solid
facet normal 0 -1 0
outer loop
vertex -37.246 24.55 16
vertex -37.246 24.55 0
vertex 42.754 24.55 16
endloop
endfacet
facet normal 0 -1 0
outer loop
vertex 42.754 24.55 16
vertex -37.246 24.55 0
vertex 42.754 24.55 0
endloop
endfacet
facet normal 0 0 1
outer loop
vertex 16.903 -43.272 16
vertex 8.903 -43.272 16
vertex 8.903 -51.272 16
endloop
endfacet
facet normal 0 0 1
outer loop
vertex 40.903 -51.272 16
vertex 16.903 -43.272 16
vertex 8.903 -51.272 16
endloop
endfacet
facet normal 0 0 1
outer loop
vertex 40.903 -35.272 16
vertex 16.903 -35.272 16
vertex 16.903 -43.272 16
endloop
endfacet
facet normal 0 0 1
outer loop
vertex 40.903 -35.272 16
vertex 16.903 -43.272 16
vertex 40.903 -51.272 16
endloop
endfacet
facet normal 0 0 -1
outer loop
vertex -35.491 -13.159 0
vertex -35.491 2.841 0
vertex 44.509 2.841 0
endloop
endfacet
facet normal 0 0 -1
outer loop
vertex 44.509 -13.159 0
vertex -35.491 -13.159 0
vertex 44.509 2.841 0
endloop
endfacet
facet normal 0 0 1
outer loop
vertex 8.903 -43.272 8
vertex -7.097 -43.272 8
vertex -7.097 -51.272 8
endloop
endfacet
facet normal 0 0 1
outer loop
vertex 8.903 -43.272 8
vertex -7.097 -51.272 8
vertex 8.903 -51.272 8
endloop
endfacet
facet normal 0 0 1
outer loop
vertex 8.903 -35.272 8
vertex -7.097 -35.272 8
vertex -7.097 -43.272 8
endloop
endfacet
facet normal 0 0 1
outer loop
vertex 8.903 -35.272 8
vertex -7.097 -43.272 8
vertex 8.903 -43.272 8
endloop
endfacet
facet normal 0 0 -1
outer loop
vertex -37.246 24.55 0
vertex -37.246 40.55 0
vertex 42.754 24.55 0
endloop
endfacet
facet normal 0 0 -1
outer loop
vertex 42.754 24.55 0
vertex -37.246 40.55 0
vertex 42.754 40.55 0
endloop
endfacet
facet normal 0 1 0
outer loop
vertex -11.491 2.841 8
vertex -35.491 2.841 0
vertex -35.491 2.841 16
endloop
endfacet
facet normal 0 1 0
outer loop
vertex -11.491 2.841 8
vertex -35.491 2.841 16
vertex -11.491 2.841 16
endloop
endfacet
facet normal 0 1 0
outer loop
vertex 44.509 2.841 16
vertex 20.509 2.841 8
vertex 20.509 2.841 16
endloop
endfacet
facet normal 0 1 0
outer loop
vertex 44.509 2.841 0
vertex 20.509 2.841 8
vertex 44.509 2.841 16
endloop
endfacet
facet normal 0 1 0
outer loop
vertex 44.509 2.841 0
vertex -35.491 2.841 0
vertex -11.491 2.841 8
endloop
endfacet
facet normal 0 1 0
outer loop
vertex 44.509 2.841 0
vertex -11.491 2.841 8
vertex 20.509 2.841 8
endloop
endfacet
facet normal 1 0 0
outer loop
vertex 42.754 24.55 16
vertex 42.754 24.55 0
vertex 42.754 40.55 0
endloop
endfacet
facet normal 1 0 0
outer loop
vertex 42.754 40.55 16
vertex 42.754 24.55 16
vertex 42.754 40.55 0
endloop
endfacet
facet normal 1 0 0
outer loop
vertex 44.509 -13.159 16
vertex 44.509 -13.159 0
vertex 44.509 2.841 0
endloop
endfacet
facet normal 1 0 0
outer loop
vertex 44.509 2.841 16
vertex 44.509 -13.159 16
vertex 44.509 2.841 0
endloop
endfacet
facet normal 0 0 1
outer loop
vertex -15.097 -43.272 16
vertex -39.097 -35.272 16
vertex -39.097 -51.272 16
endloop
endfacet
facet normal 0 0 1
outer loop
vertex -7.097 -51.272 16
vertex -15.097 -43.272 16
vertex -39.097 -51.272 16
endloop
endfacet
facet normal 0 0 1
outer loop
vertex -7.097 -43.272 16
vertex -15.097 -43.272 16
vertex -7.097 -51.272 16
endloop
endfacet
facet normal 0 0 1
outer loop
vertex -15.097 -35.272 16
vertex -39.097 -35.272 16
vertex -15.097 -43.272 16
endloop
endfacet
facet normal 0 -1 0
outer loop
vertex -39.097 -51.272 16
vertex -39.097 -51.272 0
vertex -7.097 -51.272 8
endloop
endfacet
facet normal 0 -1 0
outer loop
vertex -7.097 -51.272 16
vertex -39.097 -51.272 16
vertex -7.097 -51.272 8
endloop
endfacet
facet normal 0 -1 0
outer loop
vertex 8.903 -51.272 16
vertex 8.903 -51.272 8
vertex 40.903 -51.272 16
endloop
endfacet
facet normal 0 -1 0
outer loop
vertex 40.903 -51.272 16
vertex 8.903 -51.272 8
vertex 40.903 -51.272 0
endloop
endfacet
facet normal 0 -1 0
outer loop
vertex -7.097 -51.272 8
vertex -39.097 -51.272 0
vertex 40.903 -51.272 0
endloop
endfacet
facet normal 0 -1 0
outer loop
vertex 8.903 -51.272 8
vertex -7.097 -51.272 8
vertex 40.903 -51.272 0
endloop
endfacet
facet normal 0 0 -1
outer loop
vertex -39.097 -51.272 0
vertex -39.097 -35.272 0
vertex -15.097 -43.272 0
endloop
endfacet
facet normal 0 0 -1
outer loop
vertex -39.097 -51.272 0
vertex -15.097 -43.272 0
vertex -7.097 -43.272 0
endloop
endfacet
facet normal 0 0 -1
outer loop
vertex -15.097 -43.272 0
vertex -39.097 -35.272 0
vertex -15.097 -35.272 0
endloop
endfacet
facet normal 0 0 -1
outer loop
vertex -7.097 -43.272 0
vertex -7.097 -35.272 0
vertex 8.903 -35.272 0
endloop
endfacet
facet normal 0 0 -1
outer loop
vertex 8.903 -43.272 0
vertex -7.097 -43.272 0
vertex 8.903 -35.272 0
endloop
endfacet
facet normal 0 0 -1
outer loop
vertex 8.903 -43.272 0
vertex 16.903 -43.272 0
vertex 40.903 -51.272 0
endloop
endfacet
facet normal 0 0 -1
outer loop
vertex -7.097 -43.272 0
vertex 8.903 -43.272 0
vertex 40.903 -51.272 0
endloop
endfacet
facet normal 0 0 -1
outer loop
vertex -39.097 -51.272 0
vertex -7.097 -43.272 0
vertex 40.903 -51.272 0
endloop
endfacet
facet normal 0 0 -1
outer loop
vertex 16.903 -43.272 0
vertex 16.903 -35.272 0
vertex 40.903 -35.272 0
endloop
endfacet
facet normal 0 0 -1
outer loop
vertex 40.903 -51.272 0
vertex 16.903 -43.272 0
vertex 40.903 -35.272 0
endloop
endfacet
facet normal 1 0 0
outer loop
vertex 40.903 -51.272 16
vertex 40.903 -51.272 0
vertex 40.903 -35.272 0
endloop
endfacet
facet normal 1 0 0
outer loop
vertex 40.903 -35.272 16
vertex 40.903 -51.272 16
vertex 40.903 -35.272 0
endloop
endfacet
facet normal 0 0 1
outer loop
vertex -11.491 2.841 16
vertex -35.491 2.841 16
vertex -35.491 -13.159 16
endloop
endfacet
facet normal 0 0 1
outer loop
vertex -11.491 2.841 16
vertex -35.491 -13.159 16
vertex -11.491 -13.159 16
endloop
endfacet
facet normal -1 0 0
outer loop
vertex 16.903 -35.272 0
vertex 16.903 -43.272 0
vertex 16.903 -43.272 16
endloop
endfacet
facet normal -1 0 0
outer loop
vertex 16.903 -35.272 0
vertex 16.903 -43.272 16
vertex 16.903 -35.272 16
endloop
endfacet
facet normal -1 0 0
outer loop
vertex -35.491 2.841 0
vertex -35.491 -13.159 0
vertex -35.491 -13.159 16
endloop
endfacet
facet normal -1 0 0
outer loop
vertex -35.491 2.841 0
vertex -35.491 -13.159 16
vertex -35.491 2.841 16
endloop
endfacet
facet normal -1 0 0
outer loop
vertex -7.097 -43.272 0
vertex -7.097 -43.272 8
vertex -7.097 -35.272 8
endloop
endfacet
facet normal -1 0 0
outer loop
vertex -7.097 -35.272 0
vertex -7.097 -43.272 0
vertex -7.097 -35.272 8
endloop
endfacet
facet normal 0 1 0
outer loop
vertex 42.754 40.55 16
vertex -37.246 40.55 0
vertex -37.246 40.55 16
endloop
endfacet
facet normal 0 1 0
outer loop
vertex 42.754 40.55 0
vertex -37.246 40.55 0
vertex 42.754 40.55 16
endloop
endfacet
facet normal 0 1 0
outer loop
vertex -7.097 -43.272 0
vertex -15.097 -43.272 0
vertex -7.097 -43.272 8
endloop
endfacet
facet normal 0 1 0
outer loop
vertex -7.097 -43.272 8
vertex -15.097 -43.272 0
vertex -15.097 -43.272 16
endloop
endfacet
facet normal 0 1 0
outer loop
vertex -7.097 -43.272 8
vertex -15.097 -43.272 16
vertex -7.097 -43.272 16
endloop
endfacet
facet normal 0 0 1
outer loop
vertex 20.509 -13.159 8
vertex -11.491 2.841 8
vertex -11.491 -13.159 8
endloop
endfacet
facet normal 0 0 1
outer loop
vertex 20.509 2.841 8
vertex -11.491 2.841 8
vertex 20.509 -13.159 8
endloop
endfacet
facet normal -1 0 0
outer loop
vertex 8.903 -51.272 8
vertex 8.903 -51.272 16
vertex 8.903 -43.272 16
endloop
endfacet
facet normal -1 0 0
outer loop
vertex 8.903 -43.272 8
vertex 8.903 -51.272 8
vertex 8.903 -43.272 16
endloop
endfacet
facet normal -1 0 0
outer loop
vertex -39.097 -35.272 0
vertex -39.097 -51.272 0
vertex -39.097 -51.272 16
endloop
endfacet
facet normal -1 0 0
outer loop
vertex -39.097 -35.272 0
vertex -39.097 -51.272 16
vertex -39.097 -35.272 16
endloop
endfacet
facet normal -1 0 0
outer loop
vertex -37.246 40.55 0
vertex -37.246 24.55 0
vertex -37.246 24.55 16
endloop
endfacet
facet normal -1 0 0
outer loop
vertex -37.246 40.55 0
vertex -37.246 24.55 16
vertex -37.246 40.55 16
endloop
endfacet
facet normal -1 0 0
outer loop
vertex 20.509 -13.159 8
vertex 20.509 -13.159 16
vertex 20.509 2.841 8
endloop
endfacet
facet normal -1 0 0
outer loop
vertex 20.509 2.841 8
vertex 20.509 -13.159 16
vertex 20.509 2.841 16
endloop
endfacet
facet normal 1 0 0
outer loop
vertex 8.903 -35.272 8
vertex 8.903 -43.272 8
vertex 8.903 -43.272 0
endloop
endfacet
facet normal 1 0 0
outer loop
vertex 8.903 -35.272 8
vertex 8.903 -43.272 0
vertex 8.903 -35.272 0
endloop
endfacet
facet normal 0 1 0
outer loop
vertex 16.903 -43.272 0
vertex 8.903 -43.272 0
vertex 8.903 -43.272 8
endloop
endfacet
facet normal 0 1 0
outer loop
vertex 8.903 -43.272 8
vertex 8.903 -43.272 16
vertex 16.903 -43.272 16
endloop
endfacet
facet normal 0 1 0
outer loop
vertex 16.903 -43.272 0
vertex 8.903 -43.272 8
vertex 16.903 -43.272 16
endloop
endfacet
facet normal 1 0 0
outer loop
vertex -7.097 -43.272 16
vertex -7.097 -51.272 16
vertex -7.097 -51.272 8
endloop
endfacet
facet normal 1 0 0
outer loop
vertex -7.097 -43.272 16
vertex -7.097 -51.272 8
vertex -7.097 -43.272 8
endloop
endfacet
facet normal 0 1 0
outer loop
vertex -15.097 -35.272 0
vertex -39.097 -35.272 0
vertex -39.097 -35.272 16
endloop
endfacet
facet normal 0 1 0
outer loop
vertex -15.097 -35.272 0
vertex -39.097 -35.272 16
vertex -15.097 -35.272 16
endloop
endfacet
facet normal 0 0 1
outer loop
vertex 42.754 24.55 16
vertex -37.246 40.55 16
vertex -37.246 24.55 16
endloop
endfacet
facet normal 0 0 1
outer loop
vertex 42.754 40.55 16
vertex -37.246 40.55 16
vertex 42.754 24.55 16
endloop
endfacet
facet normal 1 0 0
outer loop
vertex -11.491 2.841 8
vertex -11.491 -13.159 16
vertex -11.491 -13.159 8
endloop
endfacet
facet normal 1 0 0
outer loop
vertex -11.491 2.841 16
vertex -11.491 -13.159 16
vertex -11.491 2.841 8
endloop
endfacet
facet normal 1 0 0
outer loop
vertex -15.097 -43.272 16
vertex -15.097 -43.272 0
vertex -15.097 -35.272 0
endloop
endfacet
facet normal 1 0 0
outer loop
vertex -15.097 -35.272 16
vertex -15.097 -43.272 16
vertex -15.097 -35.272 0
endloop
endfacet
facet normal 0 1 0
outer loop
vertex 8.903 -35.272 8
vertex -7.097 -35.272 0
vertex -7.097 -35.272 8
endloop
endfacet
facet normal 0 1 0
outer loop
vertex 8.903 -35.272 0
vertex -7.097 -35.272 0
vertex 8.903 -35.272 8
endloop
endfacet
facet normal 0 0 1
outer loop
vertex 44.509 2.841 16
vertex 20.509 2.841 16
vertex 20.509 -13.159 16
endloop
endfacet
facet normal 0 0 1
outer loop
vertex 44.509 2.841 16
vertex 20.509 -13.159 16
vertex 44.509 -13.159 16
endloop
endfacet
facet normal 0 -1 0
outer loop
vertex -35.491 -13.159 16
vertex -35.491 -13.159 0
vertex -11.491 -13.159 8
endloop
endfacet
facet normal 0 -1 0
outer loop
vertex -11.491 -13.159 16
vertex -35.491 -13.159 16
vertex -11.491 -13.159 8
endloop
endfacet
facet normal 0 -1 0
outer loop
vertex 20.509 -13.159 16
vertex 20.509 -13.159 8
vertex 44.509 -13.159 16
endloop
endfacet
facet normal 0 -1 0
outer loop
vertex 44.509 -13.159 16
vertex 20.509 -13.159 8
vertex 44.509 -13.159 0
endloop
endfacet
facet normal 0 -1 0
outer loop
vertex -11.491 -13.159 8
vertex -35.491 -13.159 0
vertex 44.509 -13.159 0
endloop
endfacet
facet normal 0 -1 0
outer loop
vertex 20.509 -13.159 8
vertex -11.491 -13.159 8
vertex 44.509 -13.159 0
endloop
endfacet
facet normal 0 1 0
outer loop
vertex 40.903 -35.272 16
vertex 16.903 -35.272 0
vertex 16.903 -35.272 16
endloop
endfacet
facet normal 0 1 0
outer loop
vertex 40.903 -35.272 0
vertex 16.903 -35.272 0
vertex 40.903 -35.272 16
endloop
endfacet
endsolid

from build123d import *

# Parameters (mm, degrees)
F0_W     = 80
F0_H     = 16
F1_DEPTH = 16
F2_W     = 32
F2_H     = 16
F3_DEPTH = 8
F4_W     = 16
F4_H     = 16
F5_DEPTH = 8
F6_W     = 8
F6_H     = 8
F7_DEPTH = 16
F8_W     = 8
F8_H     = 8
F9_DEPTH = 25


with BuildPart() as f1:
    # F0 (on Top) → F1 (new body)
    with BuildSketch(Plane.XY):
        with Locations((2.75437, 32.549724)):
            Rectangle(F0_W, F0_H)
        with Locations((4.508742, -5.158628)):
            Rectangle(F0_W, F0_H)
        with Locations((0.903399, -43.272236)):
            Rectangle(F0_W, F0_H)
    extrude(amount=F1_DEPTH)

    # F2 (on face) → F3 (cut)
    with BuildSketch(Plane.XY.offset(16)):
        with Locations((4.508742, -5.158628)):
            Rectangle(F2_W, F2_H)
    extrude(amount=-F3_DEPTH, mode=Mode.SUBTRACT)

    # F4 (on face) → F5 (cut)
    with BuildSketch(Plane.XY.offset(16)):
        with Locations((0.903399, -43.272236)):
            Rectangle(F4_W, F4_H)
    extrude(amount=-F5_DEPTH, mode=Mode.SUBTRACT)

    # F6 (on face) → F7 (cut)
    with BuildSketch(Plane.XY.offset(16)):
        with Locations((12.903399, -39.272236)):
            Rectangle(F6_W, F6_H)
    extrude(amount=-F7_DEPTH, mode=Mode.SUBTRACT)

    # F8 (on face) → F9 (cut)
    with BuildSketch(Plane.XY.offset(16)):
        with Locations((-11.096601, -39.272236)):
            Rectangle(F8_W, F8_H)
    extrude(amount=-F9_DEPTH, mode=Mode.SUBTRACT)


solid = f1.part
